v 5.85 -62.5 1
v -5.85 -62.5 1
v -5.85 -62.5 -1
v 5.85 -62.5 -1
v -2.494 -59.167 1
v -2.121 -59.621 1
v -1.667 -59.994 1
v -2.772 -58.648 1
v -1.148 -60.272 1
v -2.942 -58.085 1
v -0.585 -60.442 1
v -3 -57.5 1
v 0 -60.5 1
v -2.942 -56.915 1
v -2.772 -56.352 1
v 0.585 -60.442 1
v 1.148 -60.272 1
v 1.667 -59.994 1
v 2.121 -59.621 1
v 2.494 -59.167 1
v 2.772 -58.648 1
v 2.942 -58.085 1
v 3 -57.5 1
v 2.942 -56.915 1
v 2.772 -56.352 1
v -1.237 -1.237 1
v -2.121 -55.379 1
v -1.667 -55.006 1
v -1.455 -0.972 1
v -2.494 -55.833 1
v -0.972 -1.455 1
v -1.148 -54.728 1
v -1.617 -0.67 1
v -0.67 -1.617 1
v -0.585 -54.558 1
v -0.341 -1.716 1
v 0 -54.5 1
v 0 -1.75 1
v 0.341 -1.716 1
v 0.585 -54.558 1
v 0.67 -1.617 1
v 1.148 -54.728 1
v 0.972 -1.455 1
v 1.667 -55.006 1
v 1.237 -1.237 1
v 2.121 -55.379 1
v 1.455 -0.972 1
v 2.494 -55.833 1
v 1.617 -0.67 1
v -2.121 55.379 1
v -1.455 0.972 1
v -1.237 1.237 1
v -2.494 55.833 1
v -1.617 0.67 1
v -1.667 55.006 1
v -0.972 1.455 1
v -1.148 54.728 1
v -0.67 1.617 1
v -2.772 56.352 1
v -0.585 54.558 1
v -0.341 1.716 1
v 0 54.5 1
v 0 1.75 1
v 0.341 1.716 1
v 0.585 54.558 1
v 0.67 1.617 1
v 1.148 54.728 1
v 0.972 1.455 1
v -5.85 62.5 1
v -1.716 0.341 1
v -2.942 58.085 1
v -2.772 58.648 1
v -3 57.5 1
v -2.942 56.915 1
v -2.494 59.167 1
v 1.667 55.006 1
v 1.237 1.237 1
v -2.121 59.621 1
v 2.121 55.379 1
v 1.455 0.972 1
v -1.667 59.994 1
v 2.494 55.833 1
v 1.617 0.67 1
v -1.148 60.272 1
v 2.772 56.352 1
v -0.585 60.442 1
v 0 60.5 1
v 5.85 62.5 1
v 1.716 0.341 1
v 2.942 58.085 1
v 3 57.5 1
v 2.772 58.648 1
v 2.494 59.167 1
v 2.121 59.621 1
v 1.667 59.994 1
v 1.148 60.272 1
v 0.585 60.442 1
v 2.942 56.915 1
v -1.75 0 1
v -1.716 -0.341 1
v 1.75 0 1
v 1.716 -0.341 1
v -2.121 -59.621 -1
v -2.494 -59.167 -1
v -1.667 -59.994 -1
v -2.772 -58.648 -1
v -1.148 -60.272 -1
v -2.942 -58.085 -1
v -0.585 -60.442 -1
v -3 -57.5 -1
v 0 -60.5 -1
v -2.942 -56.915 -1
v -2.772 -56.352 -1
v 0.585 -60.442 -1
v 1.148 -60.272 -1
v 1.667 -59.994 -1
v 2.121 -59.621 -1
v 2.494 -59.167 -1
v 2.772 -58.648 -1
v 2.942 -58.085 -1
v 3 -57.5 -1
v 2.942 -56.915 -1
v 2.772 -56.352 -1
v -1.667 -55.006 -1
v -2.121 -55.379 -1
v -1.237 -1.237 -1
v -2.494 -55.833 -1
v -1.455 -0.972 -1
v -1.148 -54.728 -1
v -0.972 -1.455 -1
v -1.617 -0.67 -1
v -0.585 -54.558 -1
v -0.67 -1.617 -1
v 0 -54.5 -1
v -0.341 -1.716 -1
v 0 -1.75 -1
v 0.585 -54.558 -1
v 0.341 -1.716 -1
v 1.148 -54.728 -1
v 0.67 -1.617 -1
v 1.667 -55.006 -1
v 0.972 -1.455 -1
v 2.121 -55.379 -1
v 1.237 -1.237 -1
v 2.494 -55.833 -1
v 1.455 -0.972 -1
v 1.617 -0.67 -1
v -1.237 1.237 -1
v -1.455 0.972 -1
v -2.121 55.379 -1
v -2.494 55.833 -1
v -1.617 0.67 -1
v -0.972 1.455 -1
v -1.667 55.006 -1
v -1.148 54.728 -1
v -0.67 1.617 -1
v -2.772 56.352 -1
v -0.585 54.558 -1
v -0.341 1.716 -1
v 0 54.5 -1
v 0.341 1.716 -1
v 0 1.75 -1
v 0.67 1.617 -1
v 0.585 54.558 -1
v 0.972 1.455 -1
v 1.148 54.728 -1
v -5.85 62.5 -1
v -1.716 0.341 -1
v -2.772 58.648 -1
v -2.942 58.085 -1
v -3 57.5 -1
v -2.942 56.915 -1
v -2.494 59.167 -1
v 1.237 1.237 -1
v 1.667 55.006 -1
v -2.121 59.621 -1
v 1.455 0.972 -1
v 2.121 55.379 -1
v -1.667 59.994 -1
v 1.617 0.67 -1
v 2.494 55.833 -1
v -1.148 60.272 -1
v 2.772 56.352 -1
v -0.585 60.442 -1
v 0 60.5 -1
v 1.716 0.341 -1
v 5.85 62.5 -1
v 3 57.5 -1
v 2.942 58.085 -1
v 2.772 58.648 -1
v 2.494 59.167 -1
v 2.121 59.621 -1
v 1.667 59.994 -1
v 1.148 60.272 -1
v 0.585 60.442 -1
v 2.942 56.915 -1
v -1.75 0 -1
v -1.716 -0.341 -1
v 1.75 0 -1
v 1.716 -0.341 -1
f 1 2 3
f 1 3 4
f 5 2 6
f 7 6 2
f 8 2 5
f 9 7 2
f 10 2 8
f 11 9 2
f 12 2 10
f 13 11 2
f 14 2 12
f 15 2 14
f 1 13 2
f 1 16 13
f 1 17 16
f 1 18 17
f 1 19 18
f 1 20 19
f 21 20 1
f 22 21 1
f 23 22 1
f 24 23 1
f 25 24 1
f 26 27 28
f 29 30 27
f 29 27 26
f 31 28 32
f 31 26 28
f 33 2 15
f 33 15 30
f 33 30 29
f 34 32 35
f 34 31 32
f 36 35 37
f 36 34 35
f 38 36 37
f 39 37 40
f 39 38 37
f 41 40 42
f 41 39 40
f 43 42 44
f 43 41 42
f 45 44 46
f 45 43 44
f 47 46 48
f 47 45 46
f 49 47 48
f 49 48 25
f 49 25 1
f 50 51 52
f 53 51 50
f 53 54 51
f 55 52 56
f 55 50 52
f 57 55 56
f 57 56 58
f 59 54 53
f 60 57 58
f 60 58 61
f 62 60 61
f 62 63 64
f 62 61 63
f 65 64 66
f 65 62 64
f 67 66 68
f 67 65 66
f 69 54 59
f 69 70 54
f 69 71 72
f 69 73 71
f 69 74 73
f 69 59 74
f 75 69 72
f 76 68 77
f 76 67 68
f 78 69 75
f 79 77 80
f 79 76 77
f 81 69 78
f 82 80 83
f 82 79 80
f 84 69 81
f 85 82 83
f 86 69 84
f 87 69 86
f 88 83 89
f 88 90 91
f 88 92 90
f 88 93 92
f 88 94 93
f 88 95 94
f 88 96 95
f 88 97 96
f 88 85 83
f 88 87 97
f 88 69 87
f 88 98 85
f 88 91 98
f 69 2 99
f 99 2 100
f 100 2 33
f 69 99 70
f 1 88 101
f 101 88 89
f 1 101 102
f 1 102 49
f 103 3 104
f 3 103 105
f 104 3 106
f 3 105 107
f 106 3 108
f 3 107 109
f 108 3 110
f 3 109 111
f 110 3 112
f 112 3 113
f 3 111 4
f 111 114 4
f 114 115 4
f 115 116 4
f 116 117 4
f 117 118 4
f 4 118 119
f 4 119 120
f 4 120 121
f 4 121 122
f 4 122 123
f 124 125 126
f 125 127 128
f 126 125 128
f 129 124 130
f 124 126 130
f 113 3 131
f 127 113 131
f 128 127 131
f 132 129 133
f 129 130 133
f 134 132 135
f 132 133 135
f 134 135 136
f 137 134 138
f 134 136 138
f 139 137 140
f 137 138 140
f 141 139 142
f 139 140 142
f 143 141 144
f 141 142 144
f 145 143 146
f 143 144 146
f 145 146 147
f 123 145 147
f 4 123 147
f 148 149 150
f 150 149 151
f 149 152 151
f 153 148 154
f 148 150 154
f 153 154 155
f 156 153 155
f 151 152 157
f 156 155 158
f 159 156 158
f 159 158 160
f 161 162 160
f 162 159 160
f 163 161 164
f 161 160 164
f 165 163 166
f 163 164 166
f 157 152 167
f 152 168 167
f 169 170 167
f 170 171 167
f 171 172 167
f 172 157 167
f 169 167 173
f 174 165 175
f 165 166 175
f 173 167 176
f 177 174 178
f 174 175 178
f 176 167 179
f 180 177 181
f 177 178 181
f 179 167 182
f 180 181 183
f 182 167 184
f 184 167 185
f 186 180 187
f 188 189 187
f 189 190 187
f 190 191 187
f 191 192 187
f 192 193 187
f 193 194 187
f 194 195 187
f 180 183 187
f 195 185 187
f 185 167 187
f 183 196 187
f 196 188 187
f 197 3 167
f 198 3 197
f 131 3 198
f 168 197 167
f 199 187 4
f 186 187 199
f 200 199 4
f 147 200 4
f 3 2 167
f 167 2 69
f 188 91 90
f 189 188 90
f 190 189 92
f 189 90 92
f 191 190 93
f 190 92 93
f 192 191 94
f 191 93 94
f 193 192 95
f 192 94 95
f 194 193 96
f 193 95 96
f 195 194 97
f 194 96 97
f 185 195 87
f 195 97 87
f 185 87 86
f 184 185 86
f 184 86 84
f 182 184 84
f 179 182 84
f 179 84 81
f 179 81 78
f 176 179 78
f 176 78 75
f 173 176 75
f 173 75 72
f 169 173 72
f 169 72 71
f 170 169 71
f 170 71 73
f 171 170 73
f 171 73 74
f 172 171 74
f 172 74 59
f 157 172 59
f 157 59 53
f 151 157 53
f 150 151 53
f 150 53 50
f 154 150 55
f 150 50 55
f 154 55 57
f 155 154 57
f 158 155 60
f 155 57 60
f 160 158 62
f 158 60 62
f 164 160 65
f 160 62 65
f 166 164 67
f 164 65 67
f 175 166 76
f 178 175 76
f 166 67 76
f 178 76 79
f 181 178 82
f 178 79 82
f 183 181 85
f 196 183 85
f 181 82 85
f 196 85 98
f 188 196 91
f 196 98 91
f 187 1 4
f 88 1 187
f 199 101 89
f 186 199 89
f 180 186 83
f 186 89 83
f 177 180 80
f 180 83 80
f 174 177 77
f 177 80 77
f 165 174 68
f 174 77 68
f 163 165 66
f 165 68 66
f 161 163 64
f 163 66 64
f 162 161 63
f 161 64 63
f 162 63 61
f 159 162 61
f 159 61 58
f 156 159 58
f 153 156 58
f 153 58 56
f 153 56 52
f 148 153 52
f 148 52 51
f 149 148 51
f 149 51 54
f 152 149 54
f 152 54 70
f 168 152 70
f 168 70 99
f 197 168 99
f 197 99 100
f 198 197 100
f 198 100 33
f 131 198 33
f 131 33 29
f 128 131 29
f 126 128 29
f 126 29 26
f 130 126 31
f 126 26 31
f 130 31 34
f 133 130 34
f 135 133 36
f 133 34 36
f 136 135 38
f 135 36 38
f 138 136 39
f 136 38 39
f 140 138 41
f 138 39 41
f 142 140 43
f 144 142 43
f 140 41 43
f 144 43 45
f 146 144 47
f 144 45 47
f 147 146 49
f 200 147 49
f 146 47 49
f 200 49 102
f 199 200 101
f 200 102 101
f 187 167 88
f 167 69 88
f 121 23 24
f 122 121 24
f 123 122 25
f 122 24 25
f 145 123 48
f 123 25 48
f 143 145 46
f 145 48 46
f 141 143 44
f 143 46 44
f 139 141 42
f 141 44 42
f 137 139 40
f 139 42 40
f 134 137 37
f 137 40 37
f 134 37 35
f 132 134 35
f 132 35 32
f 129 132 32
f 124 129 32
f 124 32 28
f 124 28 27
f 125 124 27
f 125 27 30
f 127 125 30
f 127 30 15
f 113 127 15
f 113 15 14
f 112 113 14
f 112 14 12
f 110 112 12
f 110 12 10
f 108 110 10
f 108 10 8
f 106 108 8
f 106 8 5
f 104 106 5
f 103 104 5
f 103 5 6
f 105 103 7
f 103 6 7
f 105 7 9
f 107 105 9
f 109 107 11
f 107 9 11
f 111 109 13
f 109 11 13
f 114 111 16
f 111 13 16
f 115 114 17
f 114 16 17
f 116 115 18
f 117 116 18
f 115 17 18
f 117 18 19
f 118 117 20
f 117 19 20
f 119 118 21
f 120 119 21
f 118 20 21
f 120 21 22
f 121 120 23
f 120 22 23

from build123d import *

# Parameters (mm, degrees)
SKETCH1_W           = 11.7
SKETCH1_H           = 125
BOSS_EXTRUDE1_DEPTH = 1
SKETCH2_R           = 3
CUT_EXTRUDE1_DEPTH  = 3
SKETCH3_R           = 1.75
CUT_EXTRUDE2_DEPTH  = 10


with BuildPart() as part:
    # Sketch1 → Boss-Extrude1 (new body, symmetric)
    with BuildSketch(Plane.XY):
        Rectangle(SKETCH1_W, SKETCH1_H)
    extrude(amount=BOSS_EXTRUDE1_DEPTH, both=True)

    # Sketch2 → Cut-Extrude1 (cut, through all)
    with BuildSketch(Plane.XY.offset(1)):
        with Locations((0, 57.5)):
            Circle(SKETCH2_R)
        with Locations((0, -57.5)):
            Circle(SKETCH2_R)
    extrude(amount=-CUT_EXTRUDE1_DEPTH, mode=Mode.SUBTRACT)

    # Sketch3 → Cut-Extrude2 (cut)
    with BuildSketch(Plane.XY.offset(1)):
        Circle(SKETCH3_R)
    extrude(amount=-CUT_EXTRUDE2_DEPTH, mode=Mode.SUBTRACT)


solid = part.part
